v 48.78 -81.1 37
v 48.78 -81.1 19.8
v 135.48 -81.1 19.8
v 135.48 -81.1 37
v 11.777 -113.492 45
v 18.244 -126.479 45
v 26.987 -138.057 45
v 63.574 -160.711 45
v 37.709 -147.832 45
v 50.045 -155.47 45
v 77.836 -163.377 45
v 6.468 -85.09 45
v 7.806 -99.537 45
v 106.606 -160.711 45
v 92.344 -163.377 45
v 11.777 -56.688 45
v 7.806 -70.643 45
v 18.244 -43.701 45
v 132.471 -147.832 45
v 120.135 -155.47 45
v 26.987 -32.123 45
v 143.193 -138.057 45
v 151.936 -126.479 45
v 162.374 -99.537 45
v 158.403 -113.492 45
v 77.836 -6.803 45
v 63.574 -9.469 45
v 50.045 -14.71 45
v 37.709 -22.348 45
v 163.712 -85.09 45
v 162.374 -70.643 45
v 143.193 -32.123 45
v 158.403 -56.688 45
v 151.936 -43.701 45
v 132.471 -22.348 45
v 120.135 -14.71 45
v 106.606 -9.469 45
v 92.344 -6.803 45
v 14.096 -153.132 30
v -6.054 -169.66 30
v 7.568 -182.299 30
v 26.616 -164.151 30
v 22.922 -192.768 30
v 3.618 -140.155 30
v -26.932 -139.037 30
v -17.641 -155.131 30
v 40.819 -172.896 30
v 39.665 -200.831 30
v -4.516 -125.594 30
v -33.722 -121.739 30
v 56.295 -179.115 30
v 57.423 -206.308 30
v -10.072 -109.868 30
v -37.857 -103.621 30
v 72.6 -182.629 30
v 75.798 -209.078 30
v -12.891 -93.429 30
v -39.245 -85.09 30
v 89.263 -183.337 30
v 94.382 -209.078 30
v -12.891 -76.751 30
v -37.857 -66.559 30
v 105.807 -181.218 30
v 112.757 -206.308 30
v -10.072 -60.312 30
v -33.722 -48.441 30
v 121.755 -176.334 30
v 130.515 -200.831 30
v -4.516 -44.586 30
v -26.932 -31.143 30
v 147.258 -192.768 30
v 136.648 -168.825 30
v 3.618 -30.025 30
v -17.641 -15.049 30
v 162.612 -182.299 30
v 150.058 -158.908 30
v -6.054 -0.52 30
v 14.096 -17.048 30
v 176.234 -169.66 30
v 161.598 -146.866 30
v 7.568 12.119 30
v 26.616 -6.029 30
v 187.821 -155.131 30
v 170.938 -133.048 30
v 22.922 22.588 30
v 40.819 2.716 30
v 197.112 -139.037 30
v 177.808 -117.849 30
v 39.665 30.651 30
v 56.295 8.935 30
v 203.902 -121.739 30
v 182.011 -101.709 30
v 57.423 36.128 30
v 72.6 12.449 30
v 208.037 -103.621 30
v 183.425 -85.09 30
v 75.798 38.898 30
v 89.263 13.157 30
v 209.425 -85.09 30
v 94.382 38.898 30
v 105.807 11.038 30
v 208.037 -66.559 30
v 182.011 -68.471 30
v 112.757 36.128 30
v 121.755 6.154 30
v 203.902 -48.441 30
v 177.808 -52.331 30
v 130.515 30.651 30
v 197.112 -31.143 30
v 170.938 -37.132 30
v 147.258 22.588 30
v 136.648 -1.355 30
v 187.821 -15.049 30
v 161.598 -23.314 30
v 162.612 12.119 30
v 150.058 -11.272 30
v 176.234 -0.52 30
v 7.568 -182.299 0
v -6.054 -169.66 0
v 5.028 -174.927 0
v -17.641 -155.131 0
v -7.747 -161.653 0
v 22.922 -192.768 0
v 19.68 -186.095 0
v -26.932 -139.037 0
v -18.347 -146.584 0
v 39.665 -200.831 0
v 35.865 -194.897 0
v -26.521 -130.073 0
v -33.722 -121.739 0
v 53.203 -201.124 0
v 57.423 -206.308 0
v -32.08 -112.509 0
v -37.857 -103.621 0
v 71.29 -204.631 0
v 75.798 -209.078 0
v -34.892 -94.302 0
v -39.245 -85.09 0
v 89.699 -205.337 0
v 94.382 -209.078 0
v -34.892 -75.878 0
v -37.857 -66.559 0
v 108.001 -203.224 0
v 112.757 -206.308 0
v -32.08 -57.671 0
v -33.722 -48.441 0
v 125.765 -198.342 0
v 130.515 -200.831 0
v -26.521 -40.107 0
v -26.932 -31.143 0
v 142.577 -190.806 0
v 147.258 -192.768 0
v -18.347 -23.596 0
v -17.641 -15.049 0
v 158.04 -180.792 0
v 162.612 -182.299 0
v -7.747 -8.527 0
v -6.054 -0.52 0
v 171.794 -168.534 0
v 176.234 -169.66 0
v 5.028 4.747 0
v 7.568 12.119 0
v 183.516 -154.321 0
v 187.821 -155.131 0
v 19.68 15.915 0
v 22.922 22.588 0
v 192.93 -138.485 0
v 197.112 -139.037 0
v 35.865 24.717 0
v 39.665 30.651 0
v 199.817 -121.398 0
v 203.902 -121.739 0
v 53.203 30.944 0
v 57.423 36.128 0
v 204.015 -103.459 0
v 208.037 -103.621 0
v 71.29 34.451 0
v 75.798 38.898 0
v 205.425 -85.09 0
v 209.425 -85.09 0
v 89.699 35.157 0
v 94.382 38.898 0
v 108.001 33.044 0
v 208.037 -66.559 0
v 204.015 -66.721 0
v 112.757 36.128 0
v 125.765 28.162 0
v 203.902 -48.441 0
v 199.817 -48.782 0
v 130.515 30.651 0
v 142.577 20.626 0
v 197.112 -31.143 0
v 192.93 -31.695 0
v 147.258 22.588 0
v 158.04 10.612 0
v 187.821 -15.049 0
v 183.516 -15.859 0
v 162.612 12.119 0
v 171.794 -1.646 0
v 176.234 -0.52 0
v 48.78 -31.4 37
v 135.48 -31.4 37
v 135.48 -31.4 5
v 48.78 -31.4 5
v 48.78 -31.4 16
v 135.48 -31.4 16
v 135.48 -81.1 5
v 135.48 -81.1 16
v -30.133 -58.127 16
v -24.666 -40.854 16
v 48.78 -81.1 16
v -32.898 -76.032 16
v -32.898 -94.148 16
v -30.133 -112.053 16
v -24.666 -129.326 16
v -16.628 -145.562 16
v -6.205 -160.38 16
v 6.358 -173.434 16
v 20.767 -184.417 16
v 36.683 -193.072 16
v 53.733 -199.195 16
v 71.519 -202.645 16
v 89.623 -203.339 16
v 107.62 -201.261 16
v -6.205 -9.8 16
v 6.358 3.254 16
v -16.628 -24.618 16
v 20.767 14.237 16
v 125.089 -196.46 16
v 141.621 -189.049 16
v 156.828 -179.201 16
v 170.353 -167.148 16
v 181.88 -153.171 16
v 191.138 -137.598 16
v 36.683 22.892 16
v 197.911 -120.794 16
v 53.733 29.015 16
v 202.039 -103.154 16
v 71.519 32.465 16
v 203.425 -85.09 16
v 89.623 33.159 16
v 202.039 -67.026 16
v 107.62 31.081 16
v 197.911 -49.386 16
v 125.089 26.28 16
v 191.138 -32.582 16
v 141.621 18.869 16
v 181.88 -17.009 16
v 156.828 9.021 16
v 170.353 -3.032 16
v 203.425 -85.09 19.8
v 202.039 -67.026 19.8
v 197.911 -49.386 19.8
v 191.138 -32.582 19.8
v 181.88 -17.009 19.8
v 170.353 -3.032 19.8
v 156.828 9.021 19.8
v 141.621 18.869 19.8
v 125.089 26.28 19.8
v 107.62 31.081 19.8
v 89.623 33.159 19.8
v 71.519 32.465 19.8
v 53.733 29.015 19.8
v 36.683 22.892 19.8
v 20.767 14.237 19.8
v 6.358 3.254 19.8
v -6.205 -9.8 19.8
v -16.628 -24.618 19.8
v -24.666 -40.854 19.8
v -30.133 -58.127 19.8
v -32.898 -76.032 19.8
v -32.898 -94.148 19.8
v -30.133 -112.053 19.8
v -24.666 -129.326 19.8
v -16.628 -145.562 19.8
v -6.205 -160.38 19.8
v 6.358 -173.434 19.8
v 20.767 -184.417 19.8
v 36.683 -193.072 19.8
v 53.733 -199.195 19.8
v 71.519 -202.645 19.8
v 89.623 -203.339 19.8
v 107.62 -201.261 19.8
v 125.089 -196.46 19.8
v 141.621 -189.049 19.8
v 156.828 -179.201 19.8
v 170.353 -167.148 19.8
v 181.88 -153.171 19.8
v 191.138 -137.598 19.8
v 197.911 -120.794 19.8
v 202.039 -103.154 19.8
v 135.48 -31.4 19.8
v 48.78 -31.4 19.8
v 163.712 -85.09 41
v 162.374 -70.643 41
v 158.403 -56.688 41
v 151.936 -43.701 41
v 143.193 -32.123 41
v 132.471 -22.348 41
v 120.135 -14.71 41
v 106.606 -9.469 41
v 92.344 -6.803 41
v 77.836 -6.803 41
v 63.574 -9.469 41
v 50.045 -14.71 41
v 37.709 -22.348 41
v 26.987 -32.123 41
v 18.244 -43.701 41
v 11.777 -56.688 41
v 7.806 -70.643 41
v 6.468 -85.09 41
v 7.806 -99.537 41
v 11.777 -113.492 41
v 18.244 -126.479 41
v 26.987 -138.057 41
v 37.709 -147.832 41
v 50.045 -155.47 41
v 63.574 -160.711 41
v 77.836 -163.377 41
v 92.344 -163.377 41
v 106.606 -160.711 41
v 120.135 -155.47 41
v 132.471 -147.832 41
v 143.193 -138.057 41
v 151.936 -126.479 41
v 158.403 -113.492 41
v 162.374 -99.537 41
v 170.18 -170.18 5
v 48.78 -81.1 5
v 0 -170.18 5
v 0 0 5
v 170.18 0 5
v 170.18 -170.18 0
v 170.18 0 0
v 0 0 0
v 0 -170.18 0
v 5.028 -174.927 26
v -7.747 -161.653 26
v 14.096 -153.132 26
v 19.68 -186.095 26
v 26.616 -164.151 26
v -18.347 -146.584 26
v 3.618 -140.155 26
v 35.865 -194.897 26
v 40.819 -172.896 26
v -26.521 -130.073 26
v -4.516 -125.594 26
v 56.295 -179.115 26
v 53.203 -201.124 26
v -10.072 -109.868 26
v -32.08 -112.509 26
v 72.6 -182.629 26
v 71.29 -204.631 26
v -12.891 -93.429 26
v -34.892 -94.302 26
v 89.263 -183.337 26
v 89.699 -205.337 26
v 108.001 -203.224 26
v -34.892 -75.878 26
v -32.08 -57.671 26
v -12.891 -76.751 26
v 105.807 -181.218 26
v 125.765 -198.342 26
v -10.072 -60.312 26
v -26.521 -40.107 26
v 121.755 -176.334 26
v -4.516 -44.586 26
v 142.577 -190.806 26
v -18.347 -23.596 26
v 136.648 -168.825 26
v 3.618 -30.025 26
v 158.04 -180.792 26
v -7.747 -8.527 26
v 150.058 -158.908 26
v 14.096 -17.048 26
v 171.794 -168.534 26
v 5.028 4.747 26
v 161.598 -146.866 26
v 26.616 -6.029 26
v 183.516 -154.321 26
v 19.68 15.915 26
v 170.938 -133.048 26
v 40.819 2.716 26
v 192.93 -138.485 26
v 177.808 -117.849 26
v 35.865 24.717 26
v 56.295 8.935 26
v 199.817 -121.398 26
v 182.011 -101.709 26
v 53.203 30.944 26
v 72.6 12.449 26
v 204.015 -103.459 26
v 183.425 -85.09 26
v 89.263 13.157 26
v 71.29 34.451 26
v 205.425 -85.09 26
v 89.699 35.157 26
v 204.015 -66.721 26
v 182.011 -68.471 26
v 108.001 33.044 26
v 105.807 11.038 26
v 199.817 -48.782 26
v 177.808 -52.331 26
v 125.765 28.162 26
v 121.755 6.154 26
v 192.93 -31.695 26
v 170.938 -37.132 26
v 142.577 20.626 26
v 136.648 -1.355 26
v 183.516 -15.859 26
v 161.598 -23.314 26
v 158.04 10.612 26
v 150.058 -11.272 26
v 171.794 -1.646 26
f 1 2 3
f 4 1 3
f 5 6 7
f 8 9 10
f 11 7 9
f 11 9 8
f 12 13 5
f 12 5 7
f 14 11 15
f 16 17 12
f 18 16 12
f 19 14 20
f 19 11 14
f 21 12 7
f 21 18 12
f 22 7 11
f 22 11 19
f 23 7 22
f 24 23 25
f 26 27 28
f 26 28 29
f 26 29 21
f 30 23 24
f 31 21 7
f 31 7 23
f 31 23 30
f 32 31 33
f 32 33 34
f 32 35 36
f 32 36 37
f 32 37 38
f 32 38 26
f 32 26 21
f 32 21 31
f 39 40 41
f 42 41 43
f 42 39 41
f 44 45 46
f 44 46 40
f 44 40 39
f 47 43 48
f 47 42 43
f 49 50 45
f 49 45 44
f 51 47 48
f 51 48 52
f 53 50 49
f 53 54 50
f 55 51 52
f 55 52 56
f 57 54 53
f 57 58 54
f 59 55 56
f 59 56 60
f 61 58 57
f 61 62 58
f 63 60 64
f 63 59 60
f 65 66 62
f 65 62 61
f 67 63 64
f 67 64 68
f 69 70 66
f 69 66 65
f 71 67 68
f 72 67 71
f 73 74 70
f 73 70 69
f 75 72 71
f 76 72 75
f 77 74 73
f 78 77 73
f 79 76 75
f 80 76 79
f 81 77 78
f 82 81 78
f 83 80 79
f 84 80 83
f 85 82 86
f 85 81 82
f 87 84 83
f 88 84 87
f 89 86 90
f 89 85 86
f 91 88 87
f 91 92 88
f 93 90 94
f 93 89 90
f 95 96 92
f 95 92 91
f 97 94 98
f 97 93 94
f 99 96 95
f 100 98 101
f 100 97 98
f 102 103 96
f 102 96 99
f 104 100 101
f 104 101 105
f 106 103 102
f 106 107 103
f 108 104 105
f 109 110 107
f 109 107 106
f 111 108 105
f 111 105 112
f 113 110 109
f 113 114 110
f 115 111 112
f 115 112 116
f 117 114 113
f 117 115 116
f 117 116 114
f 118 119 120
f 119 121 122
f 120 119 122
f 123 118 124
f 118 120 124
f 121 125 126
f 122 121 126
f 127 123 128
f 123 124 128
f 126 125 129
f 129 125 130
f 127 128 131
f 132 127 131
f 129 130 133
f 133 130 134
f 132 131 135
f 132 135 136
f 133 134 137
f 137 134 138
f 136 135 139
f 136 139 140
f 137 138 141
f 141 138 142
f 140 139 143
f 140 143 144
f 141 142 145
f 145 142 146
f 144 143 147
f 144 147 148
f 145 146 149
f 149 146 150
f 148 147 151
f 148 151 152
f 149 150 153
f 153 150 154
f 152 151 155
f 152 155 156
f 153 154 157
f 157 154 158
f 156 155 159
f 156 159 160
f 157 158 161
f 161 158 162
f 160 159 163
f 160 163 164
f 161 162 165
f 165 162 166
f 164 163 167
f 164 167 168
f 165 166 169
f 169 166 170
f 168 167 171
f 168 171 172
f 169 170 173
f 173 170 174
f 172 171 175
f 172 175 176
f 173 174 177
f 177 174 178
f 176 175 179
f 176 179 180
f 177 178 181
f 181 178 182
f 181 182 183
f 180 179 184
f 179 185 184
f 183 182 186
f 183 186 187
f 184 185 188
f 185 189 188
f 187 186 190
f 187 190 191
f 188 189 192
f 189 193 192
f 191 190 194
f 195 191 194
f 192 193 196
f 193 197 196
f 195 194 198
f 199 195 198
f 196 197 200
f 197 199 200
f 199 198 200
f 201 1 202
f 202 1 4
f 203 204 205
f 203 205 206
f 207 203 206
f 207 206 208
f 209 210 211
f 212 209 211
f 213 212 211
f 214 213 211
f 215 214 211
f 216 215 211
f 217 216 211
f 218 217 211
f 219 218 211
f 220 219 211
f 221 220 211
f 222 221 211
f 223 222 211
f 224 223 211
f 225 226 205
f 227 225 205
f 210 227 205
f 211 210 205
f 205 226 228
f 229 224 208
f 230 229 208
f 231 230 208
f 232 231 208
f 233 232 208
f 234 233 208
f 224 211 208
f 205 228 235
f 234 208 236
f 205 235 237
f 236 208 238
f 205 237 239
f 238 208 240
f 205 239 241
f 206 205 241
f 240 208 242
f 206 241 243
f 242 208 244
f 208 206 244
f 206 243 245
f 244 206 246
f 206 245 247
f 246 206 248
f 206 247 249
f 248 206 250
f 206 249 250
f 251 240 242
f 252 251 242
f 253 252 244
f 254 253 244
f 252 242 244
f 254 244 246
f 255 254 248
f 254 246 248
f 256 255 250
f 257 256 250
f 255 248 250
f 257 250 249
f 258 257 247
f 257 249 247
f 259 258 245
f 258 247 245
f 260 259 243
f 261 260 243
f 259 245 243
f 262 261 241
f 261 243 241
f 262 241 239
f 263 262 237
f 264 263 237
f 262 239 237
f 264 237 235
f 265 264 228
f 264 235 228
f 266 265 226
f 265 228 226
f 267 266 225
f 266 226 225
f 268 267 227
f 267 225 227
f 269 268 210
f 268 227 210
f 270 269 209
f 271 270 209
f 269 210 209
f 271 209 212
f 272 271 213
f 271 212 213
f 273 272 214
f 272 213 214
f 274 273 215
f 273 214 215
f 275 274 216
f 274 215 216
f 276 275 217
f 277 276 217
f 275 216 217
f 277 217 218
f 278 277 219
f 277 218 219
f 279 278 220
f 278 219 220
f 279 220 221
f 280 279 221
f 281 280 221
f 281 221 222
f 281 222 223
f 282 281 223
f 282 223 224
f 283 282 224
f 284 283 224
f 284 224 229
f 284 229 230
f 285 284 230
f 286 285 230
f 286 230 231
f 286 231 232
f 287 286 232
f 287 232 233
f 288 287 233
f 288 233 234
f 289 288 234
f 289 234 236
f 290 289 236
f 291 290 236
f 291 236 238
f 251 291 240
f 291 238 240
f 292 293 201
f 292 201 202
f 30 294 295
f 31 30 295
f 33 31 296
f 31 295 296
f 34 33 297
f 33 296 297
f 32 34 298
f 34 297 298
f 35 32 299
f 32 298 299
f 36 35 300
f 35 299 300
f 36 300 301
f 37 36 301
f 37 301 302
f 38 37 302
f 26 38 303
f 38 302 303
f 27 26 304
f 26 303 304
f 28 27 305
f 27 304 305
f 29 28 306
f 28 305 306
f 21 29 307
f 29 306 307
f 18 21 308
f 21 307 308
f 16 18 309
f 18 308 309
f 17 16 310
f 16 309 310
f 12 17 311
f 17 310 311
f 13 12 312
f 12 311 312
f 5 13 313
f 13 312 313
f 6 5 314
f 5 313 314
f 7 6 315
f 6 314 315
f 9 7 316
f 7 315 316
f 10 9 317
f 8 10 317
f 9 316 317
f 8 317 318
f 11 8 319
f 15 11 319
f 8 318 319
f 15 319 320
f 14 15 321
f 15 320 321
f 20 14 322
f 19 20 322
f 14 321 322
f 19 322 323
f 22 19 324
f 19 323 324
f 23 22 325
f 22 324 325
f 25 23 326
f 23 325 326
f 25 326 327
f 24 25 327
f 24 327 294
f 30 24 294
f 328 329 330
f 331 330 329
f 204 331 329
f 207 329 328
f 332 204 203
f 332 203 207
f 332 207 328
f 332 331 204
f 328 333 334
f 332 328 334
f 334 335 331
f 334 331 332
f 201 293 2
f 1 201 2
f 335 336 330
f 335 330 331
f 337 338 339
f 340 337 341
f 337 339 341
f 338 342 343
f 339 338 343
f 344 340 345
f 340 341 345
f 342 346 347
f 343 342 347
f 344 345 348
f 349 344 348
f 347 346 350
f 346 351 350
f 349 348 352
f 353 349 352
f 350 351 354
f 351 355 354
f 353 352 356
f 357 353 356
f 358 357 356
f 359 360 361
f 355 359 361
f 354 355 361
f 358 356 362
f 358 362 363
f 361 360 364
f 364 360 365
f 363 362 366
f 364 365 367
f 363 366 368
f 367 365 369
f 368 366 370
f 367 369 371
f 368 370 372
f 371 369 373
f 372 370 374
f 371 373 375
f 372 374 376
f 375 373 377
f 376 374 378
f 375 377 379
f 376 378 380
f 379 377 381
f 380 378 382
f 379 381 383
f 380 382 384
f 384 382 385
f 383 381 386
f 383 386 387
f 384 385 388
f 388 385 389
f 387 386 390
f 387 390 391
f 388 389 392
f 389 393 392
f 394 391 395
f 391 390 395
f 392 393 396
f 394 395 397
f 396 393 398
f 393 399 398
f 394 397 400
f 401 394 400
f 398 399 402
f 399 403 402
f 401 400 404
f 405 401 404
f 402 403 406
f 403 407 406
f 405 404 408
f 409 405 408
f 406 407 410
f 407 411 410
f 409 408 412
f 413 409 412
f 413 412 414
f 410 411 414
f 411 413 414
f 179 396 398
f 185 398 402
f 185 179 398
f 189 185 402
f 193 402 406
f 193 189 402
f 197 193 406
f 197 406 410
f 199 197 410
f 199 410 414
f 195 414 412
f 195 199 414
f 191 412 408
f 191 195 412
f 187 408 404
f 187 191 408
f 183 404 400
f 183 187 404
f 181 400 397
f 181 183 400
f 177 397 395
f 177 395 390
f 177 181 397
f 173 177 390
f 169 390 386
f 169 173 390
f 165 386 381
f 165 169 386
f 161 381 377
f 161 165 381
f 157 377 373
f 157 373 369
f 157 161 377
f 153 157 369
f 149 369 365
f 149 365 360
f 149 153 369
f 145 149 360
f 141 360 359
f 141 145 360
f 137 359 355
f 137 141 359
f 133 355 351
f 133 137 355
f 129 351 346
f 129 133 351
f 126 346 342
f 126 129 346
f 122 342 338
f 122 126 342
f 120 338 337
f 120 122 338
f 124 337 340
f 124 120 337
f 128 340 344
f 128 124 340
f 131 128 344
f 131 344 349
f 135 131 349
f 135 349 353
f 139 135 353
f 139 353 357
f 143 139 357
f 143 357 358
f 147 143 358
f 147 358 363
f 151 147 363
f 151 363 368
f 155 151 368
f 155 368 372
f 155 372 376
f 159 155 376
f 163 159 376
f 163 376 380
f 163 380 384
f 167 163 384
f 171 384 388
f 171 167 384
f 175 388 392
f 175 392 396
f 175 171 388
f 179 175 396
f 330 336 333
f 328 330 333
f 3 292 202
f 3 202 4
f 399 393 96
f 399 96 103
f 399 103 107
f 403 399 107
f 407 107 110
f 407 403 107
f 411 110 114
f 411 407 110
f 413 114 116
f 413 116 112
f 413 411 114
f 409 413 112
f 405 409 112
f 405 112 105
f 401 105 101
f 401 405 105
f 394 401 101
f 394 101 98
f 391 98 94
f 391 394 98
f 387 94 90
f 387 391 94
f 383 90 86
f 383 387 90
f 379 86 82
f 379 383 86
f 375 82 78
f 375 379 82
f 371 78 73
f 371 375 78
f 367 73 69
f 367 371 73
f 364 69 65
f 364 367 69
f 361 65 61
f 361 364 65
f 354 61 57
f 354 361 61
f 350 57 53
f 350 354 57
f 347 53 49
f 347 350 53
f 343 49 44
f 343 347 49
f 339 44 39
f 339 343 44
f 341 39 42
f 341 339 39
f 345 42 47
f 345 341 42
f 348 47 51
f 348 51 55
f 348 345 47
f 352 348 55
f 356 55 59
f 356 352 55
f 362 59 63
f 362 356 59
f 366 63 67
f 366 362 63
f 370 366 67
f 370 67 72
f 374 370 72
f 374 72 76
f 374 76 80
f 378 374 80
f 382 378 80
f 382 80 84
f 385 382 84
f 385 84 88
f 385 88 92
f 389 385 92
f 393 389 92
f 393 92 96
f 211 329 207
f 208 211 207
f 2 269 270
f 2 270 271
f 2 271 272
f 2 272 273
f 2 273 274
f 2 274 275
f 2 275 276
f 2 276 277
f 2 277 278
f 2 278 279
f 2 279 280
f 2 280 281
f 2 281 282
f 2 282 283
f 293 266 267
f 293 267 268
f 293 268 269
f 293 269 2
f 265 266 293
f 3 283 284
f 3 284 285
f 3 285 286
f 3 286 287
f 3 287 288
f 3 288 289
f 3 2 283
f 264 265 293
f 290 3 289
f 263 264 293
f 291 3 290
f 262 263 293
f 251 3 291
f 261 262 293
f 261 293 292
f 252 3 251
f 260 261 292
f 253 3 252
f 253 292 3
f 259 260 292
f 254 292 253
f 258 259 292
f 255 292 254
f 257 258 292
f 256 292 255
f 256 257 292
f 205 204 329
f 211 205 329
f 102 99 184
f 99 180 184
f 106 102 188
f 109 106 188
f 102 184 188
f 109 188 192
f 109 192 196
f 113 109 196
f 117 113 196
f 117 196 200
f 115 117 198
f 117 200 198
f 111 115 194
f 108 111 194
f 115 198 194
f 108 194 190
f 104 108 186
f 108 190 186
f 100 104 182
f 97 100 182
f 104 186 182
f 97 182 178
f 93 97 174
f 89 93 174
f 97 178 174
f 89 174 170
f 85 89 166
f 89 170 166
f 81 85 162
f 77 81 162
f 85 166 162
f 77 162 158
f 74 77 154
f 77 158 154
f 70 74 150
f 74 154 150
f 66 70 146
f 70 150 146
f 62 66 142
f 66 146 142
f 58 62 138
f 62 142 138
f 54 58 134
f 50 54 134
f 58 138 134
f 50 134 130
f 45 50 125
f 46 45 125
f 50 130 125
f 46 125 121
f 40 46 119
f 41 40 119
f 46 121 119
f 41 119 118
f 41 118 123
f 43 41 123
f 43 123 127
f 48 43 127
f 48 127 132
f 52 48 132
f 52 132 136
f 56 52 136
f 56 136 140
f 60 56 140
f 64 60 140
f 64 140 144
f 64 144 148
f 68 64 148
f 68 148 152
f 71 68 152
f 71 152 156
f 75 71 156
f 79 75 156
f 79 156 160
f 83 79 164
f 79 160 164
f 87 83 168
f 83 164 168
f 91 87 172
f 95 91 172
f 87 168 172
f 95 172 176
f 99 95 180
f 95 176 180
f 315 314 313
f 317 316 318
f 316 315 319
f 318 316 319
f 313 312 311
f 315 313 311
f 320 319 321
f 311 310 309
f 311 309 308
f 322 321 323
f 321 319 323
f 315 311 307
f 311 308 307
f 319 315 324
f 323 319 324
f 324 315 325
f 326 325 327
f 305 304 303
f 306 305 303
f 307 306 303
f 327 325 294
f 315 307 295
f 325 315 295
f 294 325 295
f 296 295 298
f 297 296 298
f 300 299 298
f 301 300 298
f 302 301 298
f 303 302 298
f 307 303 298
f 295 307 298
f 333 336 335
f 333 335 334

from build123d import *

# Parameters (mm, degrees)
F0_W      = 170.18
F0_H      = 170.18
F1_DEPTH  = 5
F2_W      = 86.7
F2_H      = 49.7
F3_DEPTH  = 37
F6_START  = 11
F5_R      = 118.3354320223
F6_DEPTH  = 3.8
F4_R      = 124.3354320223
F4_R_2    = 120.3354320223
F8_DEPTH  = 26
F9_R      = 124.3354320223
F9_R_2    = 98.3354320223
F10_DEPTH = 4
F12_START = 4
F11_R     = 78.6222719846
F12_DEPTH = 4


# Not quite as in the source:
# - the program builds the solid bodies; features that only make, move or delete a surface that nothing else refers to are left out


with BuildPart() as f1:
    # F0 (on Top) → F1 (new body)
    with BuildSketch(Plane.XY):
        with Locations((85.09, -85.09)):
            Rectangle(F0_W, F0_H)
    extrude(amount=F1_DEPTH)

    # F2 (on face) → F3 (join)
    with BuildSketch(Plane(origin=(0, 0, 0), x_dir=(1, 0, 0), z_dir=(0, 0, -1))):
        with Locations((92.13, 56.25)):
            Rectangle(F2_W, F2_H)
    extrude(amount=-F3_DEPTH)

    # F5 (on face) → F6 (join)
    with BuildSketch(Plane.XY.offset(5).offset(F6_START)):
        with Locations((85.09, -85.09)):
            Circle(F5_R)
    extrude(amount=F6_DEPTH)


with BuildPart() as f8:
    # F4 (on Top) → F8 (new body)
    with BuildSketch(Plane.XY):
        with Locations((85.09, -85.09)):
            Circle(F4_R)
        with Locations((85.09, -85.09)):
            Circle(F4_R_2, mode=Mode.SUBTRACT)
    extrude(amount=F8_DEPTH)

    # F9 (on face) → F10 (join)
    with BuildSketch(Plane.XY.offset(26)):
        with Locations((85.09, -85.09)):
            Circle(F9_R)
        with Locations((85.09, -85.09)):
            Circle(F9_R_2, mode=Mode.SUBTRACT)
    extrude(amount=F10_DEPTH)


with BuildPart() as f12:
    # F11 (on face) → F12 (new body)
    with BuildSketch(Plane.XY.offset(37).offset(F12_START)):
        with Locations((85.09, -85.09)):
            Circle(F11_R)
    extrude(amount=F12_DEPTH)


solid = Compound([f1.part, f8.part, f12.part])
